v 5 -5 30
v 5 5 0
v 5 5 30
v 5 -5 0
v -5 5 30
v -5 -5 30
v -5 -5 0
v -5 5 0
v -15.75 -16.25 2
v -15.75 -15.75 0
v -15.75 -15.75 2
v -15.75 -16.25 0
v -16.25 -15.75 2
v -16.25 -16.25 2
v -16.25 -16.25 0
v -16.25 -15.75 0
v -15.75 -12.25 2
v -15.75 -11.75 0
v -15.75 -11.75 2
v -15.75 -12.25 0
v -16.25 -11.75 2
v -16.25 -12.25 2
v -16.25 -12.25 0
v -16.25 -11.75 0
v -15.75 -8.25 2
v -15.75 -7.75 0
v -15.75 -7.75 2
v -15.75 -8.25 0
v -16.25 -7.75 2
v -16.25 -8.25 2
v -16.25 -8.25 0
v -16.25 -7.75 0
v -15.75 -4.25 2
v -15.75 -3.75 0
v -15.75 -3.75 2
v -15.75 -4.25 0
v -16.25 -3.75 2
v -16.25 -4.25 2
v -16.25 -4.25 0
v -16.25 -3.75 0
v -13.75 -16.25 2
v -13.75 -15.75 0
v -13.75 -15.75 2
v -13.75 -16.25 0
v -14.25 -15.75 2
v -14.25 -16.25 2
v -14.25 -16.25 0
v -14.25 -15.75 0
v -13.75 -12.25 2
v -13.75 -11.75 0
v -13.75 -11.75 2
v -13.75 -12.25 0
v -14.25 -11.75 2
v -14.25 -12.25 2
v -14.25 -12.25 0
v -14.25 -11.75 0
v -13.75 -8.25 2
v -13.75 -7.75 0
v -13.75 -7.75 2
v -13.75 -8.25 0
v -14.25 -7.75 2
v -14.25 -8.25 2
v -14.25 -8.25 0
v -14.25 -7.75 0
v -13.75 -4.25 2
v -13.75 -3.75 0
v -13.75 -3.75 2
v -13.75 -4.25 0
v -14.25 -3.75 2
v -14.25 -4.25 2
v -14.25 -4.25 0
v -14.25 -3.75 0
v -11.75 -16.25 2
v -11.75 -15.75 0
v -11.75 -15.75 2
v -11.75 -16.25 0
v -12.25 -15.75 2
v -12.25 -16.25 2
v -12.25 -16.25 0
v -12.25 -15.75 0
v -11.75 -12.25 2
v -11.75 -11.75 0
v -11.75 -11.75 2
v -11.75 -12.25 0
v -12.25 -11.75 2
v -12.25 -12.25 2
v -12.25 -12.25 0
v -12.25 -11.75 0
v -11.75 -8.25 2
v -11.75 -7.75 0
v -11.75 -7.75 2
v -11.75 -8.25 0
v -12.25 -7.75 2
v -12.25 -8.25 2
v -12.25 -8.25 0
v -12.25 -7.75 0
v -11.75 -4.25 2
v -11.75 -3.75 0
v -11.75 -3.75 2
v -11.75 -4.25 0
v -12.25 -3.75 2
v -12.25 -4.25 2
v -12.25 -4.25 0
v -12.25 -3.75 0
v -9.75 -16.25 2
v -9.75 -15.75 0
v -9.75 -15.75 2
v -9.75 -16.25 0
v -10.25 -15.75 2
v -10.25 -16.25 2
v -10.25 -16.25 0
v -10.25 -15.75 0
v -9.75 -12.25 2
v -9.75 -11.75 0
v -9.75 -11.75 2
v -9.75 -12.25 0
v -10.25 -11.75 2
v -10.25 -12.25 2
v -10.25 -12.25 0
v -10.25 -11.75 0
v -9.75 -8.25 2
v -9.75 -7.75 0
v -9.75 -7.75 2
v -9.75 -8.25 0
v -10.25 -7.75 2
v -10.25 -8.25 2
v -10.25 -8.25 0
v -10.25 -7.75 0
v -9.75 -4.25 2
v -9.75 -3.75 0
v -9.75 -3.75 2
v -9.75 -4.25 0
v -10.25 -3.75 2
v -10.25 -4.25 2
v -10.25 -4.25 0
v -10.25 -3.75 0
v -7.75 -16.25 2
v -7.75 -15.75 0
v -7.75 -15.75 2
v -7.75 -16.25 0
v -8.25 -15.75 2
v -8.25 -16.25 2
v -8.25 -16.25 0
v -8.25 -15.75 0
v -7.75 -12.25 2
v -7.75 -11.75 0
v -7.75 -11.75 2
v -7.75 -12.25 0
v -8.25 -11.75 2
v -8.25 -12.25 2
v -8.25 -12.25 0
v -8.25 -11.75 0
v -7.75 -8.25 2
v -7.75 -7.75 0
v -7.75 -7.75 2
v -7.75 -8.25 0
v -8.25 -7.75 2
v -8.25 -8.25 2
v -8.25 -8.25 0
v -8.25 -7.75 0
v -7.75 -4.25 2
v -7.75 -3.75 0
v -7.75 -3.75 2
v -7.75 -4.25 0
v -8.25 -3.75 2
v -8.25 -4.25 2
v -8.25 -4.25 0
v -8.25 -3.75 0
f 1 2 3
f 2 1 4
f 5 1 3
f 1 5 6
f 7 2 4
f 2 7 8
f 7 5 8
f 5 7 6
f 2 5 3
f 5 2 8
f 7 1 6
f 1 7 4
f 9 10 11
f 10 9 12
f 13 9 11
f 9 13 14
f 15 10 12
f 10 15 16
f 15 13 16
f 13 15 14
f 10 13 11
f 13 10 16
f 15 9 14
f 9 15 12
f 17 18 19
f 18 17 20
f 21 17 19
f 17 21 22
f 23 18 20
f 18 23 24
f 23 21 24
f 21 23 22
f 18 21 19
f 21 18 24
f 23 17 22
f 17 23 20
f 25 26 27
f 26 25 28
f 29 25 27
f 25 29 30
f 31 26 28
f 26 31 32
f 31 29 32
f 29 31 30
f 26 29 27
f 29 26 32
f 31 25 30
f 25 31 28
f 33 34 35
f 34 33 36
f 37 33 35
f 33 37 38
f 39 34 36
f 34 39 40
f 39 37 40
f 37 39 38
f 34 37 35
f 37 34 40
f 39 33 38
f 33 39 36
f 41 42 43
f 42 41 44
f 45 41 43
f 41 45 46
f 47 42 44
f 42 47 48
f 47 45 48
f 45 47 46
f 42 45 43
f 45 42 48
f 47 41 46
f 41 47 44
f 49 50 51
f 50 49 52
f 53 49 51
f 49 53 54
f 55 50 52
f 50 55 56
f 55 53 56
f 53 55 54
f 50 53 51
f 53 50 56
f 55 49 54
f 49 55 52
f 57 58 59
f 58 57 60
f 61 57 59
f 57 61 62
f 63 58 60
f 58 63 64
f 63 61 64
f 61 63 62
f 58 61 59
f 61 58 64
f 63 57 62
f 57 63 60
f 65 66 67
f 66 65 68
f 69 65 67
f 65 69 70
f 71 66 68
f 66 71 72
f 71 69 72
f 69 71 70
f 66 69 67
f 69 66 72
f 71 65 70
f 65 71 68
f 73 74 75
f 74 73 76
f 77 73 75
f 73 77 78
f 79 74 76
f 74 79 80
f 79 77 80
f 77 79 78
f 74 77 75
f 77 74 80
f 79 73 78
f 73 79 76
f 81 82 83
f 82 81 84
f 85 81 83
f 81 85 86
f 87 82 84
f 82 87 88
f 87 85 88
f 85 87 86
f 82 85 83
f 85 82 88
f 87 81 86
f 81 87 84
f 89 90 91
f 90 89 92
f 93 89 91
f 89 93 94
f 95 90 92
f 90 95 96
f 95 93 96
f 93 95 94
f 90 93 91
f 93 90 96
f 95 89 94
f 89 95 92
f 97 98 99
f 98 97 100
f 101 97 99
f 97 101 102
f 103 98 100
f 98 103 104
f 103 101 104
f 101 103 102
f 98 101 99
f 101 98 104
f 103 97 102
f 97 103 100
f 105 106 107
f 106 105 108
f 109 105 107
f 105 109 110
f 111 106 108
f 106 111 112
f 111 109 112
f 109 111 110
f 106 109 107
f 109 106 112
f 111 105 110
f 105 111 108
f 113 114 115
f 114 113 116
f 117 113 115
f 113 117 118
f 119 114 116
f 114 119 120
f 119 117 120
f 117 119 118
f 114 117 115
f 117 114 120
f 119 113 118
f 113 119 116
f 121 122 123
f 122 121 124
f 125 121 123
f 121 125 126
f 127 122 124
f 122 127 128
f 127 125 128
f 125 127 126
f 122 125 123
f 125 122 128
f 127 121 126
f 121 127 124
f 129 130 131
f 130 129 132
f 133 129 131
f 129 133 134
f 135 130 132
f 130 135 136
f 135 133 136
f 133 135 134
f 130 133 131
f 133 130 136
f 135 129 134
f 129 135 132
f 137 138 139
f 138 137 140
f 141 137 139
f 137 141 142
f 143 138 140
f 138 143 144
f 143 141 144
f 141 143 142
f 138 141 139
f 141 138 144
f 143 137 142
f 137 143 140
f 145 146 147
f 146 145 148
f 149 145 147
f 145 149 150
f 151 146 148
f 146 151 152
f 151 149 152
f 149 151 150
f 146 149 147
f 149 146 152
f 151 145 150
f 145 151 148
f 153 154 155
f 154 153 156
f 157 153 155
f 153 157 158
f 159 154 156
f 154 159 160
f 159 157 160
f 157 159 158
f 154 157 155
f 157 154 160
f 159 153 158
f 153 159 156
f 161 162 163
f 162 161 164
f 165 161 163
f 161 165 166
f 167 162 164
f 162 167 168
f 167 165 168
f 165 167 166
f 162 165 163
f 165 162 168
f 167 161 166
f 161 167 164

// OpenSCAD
translate([0, 0, 15]) color([0,1,0,0.9]) cube([10, 10, 30], center=true);
translate([-16, -16, 1]) color([1,0,0]) cube([0.5, 0.5, 2], center=true);
translate([-16, -12, 1]) color([1,0,0]) cube([0.5, 0.5, 2], center=true);
translate([-16, -8, 1]) color([1,0,0]) cube([0.5, 0.5, 2], center=true);
translate([-16, -4, 1]) color([1,0,0]) cube([0.5, 0.5, 2], center=true);
translate([-14, -16, 1]) color([1,0,0]) cube([0.5, 0.5, 2], center=true);
translate([-14, -12, 1]) color([1,0,0]) cube([0.5, 0.5, 2], center=true);
translate([-14, -8, 1]) color([1,0,0]) cube([0.5, 0.5, 2], center=true);
translate([-14, -4, 1]) color([1,0,0]) cube([0.5, 0.5, 2], center=true);
translate([-12, -16, 1]) color([1,0,0]) cube([0.5, 0.5, 2], center=true);
translate([-12, -12, 1]) color([1,0,0]) cube([0.5, 0.5, 2], center=true);
translate([-12, -8, 1]) color([1,0,0]) cube([0.5, 0.5, 2], center=true);
translate([-12, -4, 1]) color([1,0,0]) cube([0.5, 0.5, 2], center=true);
translate([-10, -16, 1]) color([1,0,0]) cube([0.5, 0.5, 2], center=true);
translate([-10, -12, 1]) color([1,0,0]) cube([0.5, 0.5, 2], center=true);
translate([-10, -8, 1]) color([1,0,0]) cube([0.5, 0.5, 2], center=true);
translate([-10, -4, 1]) color([1,0,0]) cube([0.5, 0.5, 2], center=true);
translate([-8, -16, 1]) color([1,0,0]) cube([0.5, 0.5, 2], center=true);
translate([-8, -12, 1]) color([1,0,0]) cube([0.5, 0.5, 2], center=true);
translate([-8, -8, 1]) color([1,0,0]) cube([0.5, 0.5, 2], center=true);
translate([-8, -4, 1]) color([1,0,0]) cube([0.5, 0.5, 2], center=true);
